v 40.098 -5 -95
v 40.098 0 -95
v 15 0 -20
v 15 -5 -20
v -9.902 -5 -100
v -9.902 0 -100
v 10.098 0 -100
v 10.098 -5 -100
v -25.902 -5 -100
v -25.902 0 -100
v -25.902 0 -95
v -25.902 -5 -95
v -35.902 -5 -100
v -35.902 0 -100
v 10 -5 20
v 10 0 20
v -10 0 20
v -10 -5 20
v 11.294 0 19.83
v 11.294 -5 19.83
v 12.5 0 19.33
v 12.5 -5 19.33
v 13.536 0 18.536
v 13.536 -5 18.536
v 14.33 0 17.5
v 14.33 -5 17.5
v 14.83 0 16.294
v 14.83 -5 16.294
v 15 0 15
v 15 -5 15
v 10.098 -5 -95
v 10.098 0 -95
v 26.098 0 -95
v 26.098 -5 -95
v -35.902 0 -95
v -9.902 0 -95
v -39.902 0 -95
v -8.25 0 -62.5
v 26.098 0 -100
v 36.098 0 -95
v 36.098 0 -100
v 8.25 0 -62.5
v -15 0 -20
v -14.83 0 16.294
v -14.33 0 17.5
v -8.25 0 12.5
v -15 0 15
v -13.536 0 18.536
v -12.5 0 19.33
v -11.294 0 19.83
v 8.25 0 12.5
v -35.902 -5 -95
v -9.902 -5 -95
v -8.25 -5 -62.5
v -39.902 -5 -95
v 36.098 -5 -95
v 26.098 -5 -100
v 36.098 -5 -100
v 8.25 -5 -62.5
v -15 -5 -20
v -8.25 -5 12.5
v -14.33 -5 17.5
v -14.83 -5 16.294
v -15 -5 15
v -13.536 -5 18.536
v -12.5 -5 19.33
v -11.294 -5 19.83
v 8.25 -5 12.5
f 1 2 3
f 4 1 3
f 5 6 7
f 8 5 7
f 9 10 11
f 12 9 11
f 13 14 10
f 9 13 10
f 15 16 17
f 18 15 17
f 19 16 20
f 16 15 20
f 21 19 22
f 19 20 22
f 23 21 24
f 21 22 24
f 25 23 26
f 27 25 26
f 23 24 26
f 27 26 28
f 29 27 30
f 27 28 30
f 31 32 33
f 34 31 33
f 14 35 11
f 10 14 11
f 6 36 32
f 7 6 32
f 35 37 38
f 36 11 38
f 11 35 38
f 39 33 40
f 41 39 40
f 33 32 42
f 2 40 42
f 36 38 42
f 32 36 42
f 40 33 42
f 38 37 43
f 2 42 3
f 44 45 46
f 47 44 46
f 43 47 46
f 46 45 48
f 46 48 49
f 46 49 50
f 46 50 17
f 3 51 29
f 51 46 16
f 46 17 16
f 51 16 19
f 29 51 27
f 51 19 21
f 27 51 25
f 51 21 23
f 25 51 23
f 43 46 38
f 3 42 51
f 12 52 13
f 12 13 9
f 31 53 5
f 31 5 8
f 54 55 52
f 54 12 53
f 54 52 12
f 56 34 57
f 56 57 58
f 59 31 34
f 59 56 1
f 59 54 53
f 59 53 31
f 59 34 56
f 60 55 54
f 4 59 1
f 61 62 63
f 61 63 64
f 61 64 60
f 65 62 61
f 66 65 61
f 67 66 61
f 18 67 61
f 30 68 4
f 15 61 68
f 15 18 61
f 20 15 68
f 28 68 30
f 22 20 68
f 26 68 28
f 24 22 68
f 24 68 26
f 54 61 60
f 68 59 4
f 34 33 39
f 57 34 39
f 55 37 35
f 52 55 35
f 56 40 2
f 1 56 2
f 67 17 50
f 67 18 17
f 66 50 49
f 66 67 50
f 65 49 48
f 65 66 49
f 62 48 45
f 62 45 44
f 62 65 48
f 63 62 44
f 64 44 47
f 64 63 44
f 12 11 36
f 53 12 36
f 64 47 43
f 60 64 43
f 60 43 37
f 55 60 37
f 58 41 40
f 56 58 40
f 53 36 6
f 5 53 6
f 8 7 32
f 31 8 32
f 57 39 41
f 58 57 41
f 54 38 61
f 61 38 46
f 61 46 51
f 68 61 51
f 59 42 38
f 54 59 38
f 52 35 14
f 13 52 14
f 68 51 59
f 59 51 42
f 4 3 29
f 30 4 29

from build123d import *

# Parameters (mm, degrees)
F1_DEPTH = 5
F2_R     = 5
F3_R     = 5


with BuildPart() as f1:
    # F0 (on Front) → F1 (new body)
    with BuildSketch(Plane.XZ):
        Polygon((40.09773, -95), (15, -20), (8.25, -20), (8.25, -62.5), (-8.25, -62.5), (-8.25, -20), (-15, -20), (-39.90227, -95), (-35.90227, -95), (-35.90227, -100), (-25.90227, -100), (-25.90227, -95), (-9.90227, -95), (-9.90227, -100), (10.09773, -100), (10.09773, -95), (26.09773, -95), (26.09773, -100), (36.09773, -100), (36.09773, -95), align=None)
        Polygon((8.25, -20), (15, -20), (15, 20), (-15, 20), (-15, -20), (-8.25, -20), (-8.25, -12.5), (-8.25, 12.5), (8.25, 12.5), (8.25, -12.5), align=None)
    extrude(amount=F1_DEPTH)

    # F2
    f2_edges = [f1.edges().sort_by_distance(p)[0] for p in [
        (-15, -2.5, 20),
    ]]
    fillet(f2_edges, radius=F2_R)

    # F3
    f3_edges = [f1.edges().sort_by_distance(p)[0] for p in [
        (15, -2.5, 20),
    ]]
    fillet(f3_edges, radius=F3_R)


solid = f1.part
